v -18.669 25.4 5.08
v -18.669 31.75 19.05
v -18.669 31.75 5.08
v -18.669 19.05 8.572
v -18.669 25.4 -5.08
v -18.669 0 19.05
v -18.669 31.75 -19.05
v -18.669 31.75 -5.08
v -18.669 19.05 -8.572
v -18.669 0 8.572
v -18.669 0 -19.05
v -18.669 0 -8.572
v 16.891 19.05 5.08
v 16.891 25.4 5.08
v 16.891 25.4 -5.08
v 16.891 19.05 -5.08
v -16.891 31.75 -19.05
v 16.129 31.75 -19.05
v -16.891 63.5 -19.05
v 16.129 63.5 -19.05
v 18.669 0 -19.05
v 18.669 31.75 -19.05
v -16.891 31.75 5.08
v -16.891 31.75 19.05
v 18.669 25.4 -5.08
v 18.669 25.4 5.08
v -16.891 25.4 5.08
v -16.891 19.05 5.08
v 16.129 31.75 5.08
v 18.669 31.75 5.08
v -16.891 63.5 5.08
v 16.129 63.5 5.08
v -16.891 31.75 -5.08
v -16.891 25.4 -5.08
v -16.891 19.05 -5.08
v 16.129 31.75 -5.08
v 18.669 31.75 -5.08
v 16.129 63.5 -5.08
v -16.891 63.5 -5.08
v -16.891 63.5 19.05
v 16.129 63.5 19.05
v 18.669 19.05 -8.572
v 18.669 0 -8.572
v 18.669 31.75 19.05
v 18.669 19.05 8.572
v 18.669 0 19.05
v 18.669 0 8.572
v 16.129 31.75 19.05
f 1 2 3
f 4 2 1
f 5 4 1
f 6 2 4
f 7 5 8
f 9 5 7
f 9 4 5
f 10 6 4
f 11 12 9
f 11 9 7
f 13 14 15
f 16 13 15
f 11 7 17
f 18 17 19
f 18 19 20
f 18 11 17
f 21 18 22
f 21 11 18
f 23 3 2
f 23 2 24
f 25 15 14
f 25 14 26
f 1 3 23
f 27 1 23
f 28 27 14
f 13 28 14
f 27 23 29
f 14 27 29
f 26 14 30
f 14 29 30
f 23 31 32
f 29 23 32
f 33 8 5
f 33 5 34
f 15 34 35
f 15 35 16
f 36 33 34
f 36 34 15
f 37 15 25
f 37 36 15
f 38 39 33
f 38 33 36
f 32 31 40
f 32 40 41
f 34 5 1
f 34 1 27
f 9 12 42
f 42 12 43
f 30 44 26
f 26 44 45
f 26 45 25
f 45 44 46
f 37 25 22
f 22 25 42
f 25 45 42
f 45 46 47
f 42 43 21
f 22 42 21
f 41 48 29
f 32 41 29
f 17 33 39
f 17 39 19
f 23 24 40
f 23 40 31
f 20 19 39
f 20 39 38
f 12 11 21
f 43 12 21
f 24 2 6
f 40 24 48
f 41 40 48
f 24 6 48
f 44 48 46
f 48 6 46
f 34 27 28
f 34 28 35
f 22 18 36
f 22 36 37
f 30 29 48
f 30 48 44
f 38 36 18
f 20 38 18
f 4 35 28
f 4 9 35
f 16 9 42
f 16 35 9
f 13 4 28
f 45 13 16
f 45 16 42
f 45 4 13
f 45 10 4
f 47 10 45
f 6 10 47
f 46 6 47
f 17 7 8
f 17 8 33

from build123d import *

# Parameters (mm, degrees)
SKETCH1_W           = 37.338
SKETCH1_H           = 38.1
BOSS_EXTRUDE1_DEPTH = 63.5
SKETCH3_W           = 37.338
SKETCH3_H           = 10.16
CUT_EXTRUDE1_DEPTH  = 38.1
SKETCH4_W           = 37.338
SKETCH4_H           = 17.145
CUT_EXTRUDE2_DEPTH  = 19.05
SKETCH5_W           = 33.782
SKETCH5_H           = 10.16
CUT_EXTRUDE3_DEPTH  = 47.508537507
SKETCH6_W           = 2.54
SKETCH6_H           = 38.1
SKETCH6_W_2         = 1.778
CUT_EXTRUDE4_DEPTH  = 31.75


with BuildPart() as part:
    # Sketch1 → Boss-Extrude1 (new body)
    with BuildSketch(Plane(origin=(0, 0, 0), x_dir=(1, 0, 0), z_dir=(0, 1, 0))):
        Rectangle(SKETCH1_W, SKETCH1_H)
    extrude(amount=BOSS_EXTRUDE1_DEPTH)

    # Sketch3 → Cut-Extrude1 (cut)
    with BuildSketch(Plane(origin=(0, 63.5, 0), x_dir=(1, 0, 0), z_dir=(0, 1, 0))):
        Rectangle(SKETCH3_W, SKETCH3_H)
    extrude(amount=-CUT_EXTRUDE1_DEPTH, mode=Mode.SUBTRACT)

    # Sketch4 → Cut-Extrude2 (cut)
    with BuildSketch(Plane.XZ):
        Rectangle(SKETCH4_W, SKETCH4_H)
    extrude(amount=-CUT_EXTRUDE2_DEPTH, mode=Mode.SUBTRACT)

    # Sketch5 → Cut-Extrude3 (cut, through all)
    with BuildSketch(Plane(origin=(0, 25.4, 0), x_dir=(1, 0, 0), z_dir=(0, 1, 0))):
        Rectangle(SKETCH5_W, SKETCH5_H)
    extrude(amount=-CUT_EXTRUDE3_DEPTH, mode=Mode.SUBTRACT)

    # Sketch6 → Cut-Extrude4 (cut)
    with BuildSketch(Plane(origin=(0, 63.5, 0), x_dir=(1, 0, 0), z_dir=(0, 1, 0))):
        with Locations((17.399, 0)):
            Rectangle(SKETCH6_W, SKETCH6_H)
        with Locations((-17.78, 0)):
            Rectangle(SKETCH6_W_2, SKETCH6_H)
    extrude(amount=-CUT_EXTRUDE4_DEPTH, mode=Mode.SUBTRACT)


solid = part.part
